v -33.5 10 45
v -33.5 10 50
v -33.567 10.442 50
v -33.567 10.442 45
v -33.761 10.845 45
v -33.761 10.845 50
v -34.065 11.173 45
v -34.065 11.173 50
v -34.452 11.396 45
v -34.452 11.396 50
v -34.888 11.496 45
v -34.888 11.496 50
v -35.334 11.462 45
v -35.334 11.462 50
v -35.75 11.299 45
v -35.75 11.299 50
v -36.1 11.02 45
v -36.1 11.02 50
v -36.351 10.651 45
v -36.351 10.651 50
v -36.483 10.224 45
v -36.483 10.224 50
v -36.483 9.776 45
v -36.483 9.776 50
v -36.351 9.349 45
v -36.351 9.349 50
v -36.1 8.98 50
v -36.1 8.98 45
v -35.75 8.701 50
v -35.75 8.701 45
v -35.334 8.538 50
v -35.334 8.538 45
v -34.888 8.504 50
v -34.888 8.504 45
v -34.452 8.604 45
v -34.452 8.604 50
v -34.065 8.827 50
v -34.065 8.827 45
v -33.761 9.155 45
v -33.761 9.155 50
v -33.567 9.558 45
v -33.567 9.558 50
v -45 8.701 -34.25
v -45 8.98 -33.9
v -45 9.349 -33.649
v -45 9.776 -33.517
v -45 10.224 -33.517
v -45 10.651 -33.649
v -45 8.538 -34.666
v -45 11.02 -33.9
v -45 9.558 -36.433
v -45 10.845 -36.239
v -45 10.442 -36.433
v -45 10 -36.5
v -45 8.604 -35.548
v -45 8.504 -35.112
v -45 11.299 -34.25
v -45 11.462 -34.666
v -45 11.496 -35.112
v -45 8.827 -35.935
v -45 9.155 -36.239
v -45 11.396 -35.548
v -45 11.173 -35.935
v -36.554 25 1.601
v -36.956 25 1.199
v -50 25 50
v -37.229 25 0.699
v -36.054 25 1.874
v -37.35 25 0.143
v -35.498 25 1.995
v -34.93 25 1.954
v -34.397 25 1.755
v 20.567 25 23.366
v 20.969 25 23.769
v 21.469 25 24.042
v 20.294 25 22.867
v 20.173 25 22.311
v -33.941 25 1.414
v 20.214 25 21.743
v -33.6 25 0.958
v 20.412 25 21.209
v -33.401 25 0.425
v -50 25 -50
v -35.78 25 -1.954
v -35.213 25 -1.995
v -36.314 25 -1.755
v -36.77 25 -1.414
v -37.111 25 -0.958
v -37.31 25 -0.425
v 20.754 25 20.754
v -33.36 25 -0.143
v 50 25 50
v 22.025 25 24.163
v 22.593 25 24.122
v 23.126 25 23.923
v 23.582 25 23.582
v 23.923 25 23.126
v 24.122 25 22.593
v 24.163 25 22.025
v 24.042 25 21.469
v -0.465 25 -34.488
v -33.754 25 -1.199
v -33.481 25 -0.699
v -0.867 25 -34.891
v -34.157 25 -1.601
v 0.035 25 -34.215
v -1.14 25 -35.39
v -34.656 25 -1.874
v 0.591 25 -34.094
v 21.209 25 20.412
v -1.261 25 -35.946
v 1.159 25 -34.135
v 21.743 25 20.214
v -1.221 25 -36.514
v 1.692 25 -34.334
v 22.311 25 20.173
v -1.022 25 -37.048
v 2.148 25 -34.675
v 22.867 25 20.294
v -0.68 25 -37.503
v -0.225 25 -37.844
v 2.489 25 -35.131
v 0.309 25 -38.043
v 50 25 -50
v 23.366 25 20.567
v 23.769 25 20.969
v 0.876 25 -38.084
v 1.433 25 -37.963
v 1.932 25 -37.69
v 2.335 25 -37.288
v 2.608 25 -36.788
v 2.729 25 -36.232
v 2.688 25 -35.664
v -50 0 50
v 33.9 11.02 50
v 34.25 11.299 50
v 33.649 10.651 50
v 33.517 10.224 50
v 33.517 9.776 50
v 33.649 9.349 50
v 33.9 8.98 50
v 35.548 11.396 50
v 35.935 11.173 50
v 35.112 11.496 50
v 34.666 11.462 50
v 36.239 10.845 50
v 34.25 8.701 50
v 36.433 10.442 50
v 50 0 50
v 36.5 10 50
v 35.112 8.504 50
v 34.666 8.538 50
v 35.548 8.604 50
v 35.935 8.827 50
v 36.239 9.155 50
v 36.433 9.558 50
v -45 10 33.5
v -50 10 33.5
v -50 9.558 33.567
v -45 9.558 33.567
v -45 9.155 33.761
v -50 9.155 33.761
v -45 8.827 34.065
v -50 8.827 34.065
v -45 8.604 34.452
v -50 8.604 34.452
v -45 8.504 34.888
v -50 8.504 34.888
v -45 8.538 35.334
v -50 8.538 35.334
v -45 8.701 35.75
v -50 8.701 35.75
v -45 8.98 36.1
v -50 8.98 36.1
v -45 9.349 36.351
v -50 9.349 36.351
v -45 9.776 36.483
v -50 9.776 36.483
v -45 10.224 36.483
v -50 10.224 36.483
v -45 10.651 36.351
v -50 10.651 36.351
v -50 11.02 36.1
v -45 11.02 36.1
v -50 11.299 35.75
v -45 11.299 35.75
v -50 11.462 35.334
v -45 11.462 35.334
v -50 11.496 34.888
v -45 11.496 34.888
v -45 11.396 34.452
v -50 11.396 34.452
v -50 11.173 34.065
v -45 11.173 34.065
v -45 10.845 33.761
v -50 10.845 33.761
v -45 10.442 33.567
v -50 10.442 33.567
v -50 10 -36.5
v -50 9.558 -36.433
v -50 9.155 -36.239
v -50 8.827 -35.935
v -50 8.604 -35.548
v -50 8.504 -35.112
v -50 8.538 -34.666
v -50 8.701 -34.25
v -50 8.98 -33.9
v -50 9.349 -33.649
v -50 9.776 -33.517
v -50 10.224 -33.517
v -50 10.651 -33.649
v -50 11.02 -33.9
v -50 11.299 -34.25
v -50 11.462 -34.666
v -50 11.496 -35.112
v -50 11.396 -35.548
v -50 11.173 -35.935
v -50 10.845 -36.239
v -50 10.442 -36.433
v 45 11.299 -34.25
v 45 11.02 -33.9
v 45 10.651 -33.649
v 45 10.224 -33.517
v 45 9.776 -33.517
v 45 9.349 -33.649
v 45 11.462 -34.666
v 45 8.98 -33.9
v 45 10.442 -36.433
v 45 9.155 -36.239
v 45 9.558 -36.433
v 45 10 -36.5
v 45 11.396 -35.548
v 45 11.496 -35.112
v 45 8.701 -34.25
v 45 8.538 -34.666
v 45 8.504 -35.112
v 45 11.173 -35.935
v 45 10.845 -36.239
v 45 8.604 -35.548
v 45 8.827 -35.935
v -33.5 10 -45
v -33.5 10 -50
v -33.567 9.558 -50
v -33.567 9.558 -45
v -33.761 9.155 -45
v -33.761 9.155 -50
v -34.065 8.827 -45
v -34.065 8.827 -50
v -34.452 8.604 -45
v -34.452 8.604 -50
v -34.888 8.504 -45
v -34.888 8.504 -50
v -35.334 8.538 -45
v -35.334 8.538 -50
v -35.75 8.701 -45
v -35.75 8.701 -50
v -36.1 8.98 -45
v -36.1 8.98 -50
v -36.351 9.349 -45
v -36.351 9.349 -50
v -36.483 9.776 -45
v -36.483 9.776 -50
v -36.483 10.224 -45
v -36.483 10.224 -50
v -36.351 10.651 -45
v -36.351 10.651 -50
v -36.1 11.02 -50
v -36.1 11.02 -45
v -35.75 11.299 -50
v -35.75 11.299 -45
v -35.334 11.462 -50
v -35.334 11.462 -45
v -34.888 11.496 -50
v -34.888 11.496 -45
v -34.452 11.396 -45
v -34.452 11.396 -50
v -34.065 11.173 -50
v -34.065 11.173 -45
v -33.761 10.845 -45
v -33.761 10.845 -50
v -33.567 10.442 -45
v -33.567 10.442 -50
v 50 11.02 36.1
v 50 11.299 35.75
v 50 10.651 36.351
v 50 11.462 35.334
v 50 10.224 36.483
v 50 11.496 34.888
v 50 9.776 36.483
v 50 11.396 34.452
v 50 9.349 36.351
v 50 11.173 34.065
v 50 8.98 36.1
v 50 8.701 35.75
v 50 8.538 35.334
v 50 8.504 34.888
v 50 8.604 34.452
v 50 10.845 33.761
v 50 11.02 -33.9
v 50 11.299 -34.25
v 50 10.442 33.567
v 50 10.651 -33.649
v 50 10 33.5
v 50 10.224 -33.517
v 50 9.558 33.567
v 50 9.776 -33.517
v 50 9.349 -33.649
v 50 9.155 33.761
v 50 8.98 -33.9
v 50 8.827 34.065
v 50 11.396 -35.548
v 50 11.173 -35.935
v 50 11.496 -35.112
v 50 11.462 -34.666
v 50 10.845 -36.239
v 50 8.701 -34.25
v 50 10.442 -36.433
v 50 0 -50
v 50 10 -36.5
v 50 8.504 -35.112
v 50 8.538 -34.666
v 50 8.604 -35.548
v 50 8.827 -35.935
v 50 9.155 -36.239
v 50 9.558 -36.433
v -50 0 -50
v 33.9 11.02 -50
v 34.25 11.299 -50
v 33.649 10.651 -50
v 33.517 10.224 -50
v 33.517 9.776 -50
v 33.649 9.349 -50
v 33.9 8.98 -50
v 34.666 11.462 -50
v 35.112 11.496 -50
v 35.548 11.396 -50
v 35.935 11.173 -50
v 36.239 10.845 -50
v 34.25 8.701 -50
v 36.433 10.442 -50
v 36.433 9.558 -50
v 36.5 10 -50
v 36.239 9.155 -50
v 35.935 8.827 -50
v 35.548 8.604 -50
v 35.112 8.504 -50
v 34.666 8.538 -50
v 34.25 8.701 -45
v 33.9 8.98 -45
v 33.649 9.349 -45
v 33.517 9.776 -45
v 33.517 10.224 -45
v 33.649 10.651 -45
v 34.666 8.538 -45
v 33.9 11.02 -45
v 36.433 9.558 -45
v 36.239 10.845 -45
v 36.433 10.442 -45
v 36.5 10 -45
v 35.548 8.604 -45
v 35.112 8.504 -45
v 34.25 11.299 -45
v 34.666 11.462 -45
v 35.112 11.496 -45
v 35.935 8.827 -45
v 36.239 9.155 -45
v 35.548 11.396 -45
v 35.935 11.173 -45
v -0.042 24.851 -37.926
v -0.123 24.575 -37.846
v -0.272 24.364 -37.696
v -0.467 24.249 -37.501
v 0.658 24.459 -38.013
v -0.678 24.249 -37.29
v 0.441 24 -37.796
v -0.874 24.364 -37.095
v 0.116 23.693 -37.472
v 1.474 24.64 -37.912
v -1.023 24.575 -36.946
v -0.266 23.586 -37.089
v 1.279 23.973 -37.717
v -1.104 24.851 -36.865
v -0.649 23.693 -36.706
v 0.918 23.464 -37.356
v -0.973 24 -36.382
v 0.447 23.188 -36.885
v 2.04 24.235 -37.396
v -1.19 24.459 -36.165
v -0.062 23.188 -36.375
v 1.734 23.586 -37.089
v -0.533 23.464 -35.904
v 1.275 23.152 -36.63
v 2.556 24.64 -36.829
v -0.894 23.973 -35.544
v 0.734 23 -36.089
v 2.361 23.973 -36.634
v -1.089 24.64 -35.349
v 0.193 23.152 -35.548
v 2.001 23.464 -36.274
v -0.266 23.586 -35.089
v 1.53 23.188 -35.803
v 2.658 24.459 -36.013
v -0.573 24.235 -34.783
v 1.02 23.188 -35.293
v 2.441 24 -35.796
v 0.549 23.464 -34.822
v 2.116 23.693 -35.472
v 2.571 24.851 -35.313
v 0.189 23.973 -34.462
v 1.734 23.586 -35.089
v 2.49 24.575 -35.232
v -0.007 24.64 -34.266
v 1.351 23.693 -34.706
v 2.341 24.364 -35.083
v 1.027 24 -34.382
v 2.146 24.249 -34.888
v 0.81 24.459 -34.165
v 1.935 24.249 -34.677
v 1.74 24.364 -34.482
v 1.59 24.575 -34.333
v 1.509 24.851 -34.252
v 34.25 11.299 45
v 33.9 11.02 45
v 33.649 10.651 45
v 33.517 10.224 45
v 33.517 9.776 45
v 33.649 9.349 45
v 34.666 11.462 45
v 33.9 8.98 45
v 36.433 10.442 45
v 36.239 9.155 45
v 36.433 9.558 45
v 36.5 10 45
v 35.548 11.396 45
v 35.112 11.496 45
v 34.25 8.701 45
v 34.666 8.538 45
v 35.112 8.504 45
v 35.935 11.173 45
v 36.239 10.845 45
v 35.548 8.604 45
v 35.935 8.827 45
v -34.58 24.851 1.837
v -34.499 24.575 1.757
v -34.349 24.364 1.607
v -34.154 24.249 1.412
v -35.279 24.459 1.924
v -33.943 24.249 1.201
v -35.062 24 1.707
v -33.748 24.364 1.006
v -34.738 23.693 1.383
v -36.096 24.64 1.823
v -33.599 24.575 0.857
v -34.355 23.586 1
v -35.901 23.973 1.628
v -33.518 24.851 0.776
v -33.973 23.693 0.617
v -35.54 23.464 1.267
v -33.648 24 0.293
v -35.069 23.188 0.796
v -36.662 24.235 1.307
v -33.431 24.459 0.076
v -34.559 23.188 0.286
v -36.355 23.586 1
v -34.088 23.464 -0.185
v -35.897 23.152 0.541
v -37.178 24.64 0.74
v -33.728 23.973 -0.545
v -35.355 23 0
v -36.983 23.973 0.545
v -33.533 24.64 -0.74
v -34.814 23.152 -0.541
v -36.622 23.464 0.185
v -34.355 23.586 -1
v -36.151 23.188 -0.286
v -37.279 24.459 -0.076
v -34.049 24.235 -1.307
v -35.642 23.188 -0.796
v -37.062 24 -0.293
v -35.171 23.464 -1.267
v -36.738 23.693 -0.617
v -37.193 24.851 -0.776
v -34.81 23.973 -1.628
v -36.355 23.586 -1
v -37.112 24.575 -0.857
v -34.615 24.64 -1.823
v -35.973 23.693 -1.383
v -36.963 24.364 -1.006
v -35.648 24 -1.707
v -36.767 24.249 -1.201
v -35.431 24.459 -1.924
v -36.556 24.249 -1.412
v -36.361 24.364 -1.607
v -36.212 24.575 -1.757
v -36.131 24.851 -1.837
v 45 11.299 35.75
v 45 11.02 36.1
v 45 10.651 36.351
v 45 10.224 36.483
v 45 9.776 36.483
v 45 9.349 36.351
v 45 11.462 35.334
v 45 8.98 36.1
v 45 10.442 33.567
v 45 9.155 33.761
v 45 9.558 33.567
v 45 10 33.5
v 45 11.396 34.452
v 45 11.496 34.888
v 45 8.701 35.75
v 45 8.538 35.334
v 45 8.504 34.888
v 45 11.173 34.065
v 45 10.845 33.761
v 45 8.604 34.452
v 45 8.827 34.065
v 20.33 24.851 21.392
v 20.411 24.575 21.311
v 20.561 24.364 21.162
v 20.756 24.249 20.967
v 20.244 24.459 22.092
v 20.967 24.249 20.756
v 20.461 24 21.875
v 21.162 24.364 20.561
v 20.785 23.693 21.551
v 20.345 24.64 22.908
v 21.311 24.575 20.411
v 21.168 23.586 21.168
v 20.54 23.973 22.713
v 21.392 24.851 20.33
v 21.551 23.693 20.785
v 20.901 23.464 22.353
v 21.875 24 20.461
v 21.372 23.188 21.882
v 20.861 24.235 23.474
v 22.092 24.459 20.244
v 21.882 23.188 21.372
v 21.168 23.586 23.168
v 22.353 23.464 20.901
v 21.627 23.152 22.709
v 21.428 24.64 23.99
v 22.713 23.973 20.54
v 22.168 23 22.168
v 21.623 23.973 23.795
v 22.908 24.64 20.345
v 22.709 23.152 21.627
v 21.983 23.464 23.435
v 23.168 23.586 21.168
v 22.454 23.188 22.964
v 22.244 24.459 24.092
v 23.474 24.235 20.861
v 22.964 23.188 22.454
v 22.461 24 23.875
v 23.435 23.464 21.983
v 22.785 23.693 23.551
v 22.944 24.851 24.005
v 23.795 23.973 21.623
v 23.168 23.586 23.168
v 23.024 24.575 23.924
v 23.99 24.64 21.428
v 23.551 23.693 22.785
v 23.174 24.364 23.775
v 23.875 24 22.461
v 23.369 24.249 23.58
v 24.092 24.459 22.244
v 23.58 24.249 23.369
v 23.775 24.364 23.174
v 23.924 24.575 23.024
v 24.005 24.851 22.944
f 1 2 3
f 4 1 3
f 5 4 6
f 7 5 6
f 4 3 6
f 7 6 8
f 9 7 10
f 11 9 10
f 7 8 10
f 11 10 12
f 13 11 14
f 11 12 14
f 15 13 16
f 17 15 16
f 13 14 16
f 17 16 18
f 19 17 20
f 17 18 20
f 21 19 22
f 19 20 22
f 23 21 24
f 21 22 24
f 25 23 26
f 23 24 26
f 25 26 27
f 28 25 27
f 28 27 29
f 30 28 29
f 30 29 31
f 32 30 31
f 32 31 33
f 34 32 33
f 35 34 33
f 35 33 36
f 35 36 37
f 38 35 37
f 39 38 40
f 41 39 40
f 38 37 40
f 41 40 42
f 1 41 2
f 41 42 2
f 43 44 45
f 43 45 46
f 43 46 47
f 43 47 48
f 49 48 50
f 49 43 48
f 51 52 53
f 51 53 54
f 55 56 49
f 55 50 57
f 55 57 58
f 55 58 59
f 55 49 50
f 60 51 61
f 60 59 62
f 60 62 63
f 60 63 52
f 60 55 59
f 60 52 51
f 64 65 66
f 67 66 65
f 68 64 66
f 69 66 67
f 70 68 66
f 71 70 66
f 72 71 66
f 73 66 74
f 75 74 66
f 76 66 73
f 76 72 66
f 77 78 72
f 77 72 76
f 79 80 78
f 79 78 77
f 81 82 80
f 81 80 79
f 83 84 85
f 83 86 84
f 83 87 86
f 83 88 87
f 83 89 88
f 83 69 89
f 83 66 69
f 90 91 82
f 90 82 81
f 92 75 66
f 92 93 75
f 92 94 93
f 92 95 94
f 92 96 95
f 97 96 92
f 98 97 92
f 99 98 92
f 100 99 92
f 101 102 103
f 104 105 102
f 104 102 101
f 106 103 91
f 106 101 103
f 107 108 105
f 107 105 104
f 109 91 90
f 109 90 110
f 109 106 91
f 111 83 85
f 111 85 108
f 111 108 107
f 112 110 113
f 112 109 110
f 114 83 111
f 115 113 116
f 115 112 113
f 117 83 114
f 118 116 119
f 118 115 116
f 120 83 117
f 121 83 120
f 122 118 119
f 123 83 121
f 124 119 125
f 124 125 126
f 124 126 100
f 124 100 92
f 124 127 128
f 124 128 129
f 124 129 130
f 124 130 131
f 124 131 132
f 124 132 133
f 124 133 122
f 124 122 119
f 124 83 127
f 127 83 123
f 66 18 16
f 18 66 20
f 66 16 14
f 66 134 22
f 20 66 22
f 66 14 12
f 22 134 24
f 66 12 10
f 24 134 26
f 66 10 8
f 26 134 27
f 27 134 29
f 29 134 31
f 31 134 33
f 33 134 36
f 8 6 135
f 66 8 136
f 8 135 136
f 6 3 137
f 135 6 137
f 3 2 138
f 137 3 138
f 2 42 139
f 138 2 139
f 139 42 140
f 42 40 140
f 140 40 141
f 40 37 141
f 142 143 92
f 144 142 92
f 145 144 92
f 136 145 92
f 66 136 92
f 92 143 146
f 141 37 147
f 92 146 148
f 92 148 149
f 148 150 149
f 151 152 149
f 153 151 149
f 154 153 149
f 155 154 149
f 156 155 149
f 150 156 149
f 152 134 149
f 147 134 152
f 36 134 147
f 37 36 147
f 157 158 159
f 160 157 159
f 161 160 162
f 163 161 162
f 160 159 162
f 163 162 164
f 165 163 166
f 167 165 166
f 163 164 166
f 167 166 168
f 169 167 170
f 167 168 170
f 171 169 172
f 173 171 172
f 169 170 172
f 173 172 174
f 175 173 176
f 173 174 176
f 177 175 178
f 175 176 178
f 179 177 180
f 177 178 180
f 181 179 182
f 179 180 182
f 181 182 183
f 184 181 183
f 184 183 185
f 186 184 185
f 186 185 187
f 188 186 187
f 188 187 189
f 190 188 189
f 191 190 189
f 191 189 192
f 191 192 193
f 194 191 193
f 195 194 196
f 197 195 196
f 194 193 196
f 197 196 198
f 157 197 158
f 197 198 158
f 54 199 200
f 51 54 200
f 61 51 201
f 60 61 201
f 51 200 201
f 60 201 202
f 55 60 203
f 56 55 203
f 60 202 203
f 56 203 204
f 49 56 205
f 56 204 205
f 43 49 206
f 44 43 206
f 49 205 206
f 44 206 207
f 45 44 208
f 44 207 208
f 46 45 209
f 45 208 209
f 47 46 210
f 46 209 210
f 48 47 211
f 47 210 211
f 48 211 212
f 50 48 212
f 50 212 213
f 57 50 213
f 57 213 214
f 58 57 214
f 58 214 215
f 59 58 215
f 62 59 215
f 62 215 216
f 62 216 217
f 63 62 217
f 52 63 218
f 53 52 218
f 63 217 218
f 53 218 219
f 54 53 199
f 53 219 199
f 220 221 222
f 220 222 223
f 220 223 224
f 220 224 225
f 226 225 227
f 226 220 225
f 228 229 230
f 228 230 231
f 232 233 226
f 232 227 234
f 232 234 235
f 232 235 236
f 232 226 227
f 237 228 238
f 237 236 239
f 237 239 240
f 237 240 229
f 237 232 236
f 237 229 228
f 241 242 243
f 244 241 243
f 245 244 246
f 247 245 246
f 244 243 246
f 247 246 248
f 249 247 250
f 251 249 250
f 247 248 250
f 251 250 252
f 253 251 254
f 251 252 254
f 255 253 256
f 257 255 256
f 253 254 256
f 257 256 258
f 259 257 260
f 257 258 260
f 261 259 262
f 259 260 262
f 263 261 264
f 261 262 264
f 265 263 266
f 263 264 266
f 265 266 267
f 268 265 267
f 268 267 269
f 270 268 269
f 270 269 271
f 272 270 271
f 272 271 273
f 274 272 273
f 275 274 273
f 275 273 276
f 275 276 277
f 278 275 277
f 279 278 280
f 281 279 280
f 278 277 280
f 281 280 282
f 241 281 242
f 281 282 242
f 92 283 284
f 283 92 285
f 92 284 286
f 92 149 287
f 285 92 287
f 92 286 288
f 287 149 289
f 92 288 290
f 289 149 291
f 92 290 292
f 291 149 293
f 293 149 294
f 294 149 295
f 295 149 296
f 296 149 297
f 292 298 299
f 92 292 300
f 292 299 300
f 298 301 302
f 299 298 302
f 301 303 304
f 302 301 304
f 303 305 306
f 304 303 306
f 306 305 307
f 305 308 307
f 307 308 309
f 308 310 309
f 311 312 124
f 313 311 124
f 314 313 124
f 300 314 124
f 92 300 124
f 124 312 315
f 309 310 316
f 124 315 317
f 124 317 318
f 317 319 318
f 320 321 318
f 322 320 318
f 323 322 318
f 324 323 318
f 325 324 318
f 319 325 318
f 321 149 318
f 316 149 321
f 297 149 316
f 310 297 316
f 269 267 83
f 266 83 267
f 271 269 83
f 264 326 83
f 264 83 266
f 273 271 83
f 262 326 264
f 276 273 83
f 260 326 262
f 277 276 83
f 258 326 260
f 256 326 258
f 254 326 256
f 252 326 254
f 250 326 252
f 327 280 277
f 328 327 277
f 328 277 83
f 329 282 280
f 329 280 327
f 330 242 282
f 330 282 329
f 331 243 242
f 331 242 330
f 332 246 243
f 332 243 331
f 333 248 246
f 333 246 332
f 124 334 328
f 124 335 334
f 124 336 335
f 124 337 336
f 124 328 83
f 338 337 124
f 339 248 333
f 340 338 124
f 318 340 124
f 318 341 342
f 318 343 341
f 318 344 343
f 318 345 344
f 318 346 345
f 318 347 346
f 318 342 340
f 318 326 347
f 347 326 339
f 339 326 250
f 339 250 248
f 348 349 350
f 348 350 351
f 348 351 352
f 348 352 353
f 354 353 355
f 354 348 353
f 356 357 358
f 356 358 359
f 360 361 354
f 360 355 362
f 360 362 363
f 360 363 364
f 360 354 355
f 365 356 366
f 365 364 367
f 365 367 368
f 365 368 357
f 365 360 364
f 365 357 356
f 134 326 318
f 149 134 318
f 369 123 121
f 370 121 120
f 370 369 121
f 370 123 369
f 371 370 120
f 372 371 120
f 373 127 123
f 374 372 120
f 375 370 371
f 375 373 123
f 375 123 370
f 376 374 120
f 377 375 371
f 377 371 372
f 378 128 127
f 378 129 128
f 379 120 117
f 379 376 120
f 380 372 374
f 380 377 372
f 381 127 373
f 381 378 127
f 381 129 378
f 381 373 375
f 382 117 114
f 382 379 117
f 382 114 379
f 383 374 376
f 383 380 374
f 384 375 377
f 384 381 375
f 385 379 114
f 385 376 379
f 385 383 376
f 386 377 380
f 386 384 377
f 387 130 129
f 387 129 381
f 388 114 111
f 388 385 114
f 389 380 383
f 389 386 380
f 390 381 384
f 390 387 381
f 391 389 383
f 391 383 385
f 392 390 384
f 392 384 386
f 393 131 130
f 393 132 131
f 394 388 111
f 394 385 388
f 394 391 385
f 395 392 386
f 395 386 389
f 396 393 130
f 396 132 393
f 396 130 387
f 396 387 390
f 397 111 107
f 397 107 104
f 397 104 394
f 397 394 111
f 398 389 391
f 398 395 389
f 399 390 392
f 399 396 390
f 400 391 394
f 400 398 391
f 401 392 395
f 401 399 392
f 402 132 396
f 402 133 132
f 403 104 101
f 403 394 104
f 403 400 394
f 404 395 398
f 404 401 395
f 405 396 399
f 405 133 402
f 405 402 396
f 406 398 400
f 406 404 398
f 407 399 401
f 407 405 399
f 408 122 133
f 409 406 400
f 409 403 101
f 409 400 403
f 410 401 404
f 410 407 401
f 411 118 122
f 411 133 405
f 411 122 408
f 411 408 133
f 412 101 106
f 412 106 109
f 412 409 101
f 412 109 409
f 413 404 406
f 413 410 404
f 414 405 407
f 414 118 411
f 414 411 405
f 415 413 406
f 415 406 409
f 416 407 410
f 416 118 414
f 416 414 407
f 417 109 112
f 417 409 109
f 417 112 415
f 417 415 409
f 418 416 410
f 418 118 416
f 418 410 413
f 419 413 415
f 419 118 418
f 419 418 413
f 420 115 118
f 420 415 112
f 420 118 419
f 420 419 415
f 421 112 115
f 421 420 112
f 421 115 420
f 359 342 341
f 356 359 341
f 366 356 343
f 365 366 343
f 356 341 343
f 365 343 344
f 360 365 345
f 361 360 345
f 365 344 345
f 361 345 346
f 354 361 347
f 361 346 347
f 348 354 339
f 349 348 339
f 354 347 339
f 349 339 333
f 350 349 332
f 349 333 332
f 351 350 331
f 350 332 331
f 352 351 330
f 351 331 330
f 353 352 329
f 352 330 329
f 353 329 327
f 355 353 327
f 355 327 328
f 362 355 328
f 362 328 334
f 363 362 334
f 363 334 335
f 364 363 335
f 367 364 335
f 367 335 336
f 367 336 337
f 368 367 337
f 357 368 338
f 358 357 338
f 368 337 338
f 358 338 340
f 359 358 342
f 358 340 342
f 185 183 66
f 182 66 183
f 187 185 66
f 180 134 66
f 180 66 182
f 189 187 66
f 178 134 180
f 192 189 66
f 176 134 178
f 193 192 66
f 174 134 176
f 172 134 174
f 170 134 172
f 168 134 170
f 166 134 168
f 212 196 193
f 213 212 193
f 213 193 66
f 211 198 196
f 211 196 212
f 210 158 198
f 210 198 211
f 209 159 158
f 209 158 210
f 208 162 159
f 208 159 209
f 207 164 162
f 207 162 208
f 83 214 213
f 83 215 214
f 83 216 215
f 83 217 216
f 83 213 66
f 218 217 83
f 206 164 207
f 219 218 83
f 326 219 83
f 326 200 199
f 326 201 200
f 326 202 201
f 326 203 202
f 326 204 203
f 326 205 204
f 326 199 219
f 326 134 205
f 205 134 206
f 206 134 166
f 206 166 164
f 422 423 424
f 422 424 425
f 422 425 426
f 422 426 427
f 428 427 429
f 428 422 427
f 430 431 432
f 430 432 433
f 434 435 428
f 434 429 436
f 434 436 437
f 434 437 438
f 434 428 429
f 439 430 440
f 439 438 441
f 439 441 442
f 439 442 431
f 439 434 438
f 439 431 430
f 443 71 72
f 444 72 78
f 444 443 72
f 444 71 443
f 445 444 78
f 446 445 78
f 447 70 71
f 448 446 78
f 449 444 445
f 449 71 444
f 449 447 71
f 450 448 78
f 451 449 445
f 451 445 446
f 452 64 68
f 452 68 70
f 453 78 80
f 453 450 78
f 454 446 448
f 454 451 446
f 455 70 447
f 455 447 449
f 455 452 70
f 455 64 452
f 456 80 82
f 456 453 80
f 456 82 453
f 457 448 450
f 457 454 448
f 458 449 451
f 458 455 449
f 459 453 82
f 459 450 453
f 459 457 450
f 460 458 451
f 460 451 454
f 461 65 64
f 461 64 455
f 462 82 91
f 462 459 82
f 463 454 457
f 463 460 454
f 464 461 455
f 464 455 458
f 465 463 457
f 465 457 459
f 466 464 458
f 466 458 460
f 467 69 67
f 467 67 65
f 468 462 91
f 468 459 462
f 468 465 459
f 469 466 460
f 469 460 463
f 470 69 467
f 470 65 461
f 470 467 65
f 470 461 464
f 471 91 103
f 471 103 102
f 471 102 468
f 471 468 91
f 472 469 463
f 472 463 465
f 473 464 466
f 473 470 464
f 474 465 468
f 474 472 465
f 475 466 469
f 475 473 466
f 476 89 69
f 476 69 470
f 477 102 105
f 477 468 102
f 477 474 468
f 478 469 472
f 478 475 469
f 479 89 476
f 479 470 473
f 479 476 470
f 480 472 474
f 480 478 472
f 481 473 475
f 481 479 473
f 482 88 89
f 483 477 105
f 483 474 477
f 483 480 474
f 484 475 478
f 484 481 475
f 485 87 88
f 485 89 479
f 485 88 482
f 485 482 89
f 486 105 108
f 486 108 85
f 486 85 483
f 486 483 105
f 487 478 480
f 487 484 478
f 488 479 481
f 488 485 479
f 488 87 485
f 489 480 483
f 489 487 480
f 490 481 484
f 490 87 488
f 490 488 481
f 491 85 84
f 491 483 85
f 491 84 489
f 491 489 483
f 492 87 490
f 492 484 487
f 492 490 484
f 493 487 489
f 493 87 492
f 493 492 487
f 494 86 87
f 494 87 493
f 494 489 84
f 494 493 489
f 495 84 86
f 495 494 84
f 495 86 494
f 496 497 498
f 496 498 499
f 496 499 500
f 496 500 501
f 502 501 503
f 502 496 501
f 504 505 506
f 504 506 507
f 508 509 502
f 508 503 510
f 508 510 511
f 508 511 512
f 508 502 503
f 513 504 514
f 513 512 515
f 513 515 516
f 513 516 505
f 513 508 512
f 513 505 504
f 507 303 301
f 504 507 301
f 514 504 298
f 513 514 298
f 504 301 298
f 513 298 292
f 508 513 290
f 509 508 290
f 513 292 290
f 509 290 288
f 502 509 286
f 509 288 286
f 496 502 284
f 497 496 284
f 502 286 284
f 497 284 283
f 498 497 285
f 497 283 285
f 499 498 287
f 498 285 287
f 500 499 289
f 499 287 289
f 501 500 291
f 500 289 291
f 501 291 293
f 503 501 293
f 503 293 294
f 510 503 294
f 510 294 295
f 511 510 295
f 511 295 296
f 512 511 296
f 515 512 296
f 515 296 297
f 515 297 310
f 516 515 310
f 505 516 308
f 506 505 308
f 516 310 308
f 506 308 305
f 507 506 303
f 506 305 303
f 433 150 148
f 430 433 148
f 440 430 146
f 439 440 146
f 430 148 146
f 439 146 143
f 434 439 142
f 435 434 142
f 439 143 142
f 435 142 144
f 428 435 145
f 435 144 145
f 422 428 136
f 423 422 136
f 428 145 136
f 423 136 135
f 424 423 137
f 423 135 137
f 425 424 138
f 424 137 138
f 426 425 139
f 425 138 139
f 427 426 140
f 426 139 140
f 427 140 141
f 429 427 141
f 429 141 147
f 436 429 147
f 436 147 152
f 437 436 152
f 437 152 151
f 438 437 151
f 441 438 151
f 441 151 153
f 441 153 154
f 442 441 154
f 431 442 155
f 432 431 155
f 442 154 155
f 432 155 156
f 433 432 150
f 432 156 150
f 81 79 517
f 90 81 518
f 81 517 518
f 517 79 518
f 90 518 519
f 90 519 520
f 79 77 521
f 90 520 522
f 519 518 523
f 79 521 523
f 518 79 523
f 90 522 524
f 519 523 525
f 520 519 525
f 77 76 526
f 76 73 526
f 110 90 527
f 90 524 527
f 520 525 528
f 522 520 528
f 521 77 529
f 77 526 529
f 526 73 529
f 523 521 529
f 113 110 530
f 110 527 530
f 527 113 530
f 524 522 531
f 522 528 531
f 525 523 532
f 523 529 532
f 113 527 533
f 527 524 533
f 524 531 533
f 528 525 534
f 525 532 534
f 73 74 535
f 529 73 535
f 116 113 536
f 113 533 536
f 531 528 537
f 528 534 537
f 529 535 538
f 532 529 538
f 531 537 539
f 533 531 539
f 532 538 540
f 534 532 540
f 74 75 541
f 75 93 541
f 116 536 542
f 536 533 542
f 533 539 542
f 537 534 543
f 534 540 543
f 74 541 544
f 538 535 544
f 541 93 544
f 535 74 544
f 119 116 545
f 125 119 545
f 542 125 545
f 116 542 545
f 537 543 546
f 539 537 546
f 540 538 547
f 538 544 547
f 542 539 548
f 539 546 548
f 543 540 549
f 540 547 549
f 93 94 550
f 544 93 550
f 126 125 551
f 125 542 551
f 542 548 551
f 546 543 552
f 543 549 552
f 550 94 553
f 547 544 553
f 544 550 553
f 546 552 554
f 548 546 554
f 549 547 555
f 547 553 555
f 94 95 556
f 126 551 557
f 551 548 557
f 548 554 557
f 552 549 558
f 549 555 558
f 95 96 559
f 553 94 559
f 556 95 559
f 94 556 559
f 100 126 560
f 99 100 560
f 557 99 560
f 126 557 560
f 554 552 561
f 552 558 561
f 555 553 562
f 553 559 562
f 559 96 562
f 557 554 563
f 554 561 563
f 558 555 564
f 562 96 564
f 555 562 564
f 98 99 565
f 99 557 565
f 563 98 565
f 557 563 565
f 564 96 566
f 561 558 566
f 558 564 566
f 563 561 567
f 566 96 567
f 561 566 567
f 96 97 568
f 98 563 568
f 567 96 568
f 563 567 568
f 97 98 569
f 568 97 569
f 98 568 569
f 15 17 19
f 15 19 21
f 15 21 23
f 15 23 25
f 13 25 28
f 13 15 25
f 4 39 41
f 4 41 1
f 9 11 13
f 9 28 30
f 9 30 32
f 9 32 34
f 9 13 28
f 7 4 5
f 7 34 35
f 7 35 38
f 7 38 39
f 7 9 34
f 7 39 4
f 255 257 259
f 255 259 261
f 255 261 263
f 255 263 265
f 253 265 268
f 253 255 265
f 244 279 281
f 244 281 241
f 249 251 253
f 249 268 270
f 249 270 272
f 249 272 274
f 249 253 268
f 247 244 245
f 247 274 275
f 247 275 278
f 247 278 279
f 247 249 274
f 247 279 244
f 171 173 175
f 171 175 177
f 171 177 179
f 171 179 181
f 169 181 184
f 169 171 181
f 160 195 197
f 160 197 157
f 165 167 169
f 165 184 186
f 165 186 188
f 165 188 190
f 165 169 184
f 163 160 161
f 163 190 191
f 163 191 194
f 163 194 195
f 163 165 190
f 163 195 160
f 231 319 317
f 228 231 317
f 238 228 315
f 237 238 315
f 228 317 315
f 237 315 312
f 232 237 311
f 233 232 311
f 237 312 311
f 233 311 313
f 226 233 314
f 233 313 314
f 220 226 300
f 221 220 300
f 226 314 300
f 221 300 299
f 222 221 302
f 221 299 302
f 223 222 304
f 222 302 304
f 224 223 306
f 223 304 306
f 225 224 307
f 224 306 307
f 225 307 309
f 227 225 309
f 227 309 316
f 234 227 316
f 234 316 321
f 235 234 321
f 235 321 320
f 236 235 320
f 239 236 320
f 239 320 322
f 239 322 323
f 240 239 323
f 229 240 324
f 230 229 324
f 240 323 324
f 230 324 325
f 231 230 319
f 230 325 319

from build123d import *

# Parameters (mm, degrees)
SKETCH1_W           = 100
SKETCH1_H           = 100
BOSS_EXTRUDE1_DEPTH = 25
SKETCH5_R           = 1.5
CUT_EXTRUDE1_DEPTH  = 5
SKETCH6_R           = 1.5
CUT_EXTRUDE2_DEPTH  = 5
SKETCH7_R           = 1.5
CUT_EXTRUDE3_DEPTH  = 5
SKETCH8_R           = 1.5
CUT_EXTRUDE4_DEPTH  = 5


with BuildPart() as part:
    # Sketch1 → Boss-Extrude1 (new body)
    with BuildSketch(Plane(origin=(0, 0, 0), x_dir=(1, 0, 0), z_dir=(0, 1, 0))):
        Rectangle(SKETCH1_W, SKETCH1_H)
    extrude(amount=BOSS_EXTRUDE1_DEPTH)

    # Sketch2 → Cut-Revolve7 (revolve, cut)
    with BuildSketch(Plane(origin=(0, 25, 0), x_dir=(1, 0, 0), z_dir=(0, 1, 0))):
        with BuildLine():
            Line((-36.769552622, 1.414213562), (-33.941125497, -1.414213562))
            ThreePointArc((-33.941125497, -1.414213562), (-33.941125497, 1.414213562), (-36.769552622, 1.414213562))
        make_face()
    revolve(axis=Axis((-36.769552622, 25, -1.414213562), (0.707106781, 0, 0.707106781)), mode=Mode.SUBTRACT)

    # Sketch3 → Cut-Revolve8 (revolve, cut)
    with BuildSketch(Plane(origin=(0, 25, 0), x_dir=(1, 0, 0), z_dir=(0, 1, 0))):
        with BuildLine():
            Line((2.147947634, 34.674859569), (-0.680479491, 37.503286693))
            ThreePointArc((-0.680479491, 37.503286693), (2.147947634, 37.503286693), (2.147947634, 34.674859569))
        make_face()
    revolve(axis=Axis((2.147947634, 25, -34.674859569), (-0.707106781, 0, -0.707106781)), mode=Mode.SUBTRACT)

    # Sketch4 → Cut-Revolve9 (revolve, cut)
    with BuildSketch(Plane(origin=(0, 25, 0), x_dir=(1, 0, 0), z_dir=(0, 1, 0))):
        with BuildLine():
            Line((23.582045131, -23.582045131), (20.753618006, -20.753618006))
            ThreePointArc((20.753618006, -20.753618006), (23.582045131, -20.753618006), (23.582045131, -23.582045131))
        make_face()
    revolve(axis=Axis((-50, 25, -50), (0.707106781, 0, 0.707106781)), mode=Mode.SUBTRACT)

    # Sketch5 → Cut-Extrude1 (cut)
    with BuildSketch(Plane.XY.offset(50)):
        with Locations((-35, 10)):
            Circle(SKETCH5_R)
        with Locations((35, 10)):
            Circle(SKETCH5_R)
    extrude(amount=-CUT_EXTRUDE1_DEPTH, mode=Mode.SUBTRACT)

    # Sketch6 → Cut-Extrude2 (cut)
    with BuildSketch(Plane(origin=(50, 0, 0), x_dir=(0, 0, -1), z_dir=(1, 0, 0))):
        with Locations((-35, 10)):
            Circle(SKETCH6_R)
        with Locations((35, 10)):
            Circle(SKETCH6_R)
    extrude(amount=-CUT_EXTRUDE2_DEPTH, mode=Mode.SUBTRACT)

    # Sketch7 → Cut-Extrude3 (cut)
    with BuildSketch(Plane(origin=(0, 0, -50), x_dir=(-1, 0, 0), z_dir=(0, 0, -1))):
        with Locations(Location((-35, 10, 0), (0, 0, 180))):  # turned: the seam where the file's is
            Circle(SKETCH7_R)
        with Locations(Location((35, 10, 0), (0, 0, 180))):  # turned: the seam where the file's is
            Circle(SKETCH7_R)
    extrude(amount=-CUT_EXTRUDE3_DEPTH, mode=Mode.SUBTRACT)

    # Sketch8 → Cut-Extrude4 (cut)
    with BuildSketch(Plane.ZY.offset(50)):
        with Locations(Location((-35, 10, 0), (0, 0, 180))):  # turned: the seam where the file's is
            Circle(SKETCH8_R)
        with Locations(Location((35, 10, 0), (0, 0, 180))):  # turned: the seam where the file's is
            Circle(SKETCH8_R)
    extrude(amount=-CUT_EXTRUDE4_DEPTH, mode=Mode.SUBTRACT)


solid = part.part
